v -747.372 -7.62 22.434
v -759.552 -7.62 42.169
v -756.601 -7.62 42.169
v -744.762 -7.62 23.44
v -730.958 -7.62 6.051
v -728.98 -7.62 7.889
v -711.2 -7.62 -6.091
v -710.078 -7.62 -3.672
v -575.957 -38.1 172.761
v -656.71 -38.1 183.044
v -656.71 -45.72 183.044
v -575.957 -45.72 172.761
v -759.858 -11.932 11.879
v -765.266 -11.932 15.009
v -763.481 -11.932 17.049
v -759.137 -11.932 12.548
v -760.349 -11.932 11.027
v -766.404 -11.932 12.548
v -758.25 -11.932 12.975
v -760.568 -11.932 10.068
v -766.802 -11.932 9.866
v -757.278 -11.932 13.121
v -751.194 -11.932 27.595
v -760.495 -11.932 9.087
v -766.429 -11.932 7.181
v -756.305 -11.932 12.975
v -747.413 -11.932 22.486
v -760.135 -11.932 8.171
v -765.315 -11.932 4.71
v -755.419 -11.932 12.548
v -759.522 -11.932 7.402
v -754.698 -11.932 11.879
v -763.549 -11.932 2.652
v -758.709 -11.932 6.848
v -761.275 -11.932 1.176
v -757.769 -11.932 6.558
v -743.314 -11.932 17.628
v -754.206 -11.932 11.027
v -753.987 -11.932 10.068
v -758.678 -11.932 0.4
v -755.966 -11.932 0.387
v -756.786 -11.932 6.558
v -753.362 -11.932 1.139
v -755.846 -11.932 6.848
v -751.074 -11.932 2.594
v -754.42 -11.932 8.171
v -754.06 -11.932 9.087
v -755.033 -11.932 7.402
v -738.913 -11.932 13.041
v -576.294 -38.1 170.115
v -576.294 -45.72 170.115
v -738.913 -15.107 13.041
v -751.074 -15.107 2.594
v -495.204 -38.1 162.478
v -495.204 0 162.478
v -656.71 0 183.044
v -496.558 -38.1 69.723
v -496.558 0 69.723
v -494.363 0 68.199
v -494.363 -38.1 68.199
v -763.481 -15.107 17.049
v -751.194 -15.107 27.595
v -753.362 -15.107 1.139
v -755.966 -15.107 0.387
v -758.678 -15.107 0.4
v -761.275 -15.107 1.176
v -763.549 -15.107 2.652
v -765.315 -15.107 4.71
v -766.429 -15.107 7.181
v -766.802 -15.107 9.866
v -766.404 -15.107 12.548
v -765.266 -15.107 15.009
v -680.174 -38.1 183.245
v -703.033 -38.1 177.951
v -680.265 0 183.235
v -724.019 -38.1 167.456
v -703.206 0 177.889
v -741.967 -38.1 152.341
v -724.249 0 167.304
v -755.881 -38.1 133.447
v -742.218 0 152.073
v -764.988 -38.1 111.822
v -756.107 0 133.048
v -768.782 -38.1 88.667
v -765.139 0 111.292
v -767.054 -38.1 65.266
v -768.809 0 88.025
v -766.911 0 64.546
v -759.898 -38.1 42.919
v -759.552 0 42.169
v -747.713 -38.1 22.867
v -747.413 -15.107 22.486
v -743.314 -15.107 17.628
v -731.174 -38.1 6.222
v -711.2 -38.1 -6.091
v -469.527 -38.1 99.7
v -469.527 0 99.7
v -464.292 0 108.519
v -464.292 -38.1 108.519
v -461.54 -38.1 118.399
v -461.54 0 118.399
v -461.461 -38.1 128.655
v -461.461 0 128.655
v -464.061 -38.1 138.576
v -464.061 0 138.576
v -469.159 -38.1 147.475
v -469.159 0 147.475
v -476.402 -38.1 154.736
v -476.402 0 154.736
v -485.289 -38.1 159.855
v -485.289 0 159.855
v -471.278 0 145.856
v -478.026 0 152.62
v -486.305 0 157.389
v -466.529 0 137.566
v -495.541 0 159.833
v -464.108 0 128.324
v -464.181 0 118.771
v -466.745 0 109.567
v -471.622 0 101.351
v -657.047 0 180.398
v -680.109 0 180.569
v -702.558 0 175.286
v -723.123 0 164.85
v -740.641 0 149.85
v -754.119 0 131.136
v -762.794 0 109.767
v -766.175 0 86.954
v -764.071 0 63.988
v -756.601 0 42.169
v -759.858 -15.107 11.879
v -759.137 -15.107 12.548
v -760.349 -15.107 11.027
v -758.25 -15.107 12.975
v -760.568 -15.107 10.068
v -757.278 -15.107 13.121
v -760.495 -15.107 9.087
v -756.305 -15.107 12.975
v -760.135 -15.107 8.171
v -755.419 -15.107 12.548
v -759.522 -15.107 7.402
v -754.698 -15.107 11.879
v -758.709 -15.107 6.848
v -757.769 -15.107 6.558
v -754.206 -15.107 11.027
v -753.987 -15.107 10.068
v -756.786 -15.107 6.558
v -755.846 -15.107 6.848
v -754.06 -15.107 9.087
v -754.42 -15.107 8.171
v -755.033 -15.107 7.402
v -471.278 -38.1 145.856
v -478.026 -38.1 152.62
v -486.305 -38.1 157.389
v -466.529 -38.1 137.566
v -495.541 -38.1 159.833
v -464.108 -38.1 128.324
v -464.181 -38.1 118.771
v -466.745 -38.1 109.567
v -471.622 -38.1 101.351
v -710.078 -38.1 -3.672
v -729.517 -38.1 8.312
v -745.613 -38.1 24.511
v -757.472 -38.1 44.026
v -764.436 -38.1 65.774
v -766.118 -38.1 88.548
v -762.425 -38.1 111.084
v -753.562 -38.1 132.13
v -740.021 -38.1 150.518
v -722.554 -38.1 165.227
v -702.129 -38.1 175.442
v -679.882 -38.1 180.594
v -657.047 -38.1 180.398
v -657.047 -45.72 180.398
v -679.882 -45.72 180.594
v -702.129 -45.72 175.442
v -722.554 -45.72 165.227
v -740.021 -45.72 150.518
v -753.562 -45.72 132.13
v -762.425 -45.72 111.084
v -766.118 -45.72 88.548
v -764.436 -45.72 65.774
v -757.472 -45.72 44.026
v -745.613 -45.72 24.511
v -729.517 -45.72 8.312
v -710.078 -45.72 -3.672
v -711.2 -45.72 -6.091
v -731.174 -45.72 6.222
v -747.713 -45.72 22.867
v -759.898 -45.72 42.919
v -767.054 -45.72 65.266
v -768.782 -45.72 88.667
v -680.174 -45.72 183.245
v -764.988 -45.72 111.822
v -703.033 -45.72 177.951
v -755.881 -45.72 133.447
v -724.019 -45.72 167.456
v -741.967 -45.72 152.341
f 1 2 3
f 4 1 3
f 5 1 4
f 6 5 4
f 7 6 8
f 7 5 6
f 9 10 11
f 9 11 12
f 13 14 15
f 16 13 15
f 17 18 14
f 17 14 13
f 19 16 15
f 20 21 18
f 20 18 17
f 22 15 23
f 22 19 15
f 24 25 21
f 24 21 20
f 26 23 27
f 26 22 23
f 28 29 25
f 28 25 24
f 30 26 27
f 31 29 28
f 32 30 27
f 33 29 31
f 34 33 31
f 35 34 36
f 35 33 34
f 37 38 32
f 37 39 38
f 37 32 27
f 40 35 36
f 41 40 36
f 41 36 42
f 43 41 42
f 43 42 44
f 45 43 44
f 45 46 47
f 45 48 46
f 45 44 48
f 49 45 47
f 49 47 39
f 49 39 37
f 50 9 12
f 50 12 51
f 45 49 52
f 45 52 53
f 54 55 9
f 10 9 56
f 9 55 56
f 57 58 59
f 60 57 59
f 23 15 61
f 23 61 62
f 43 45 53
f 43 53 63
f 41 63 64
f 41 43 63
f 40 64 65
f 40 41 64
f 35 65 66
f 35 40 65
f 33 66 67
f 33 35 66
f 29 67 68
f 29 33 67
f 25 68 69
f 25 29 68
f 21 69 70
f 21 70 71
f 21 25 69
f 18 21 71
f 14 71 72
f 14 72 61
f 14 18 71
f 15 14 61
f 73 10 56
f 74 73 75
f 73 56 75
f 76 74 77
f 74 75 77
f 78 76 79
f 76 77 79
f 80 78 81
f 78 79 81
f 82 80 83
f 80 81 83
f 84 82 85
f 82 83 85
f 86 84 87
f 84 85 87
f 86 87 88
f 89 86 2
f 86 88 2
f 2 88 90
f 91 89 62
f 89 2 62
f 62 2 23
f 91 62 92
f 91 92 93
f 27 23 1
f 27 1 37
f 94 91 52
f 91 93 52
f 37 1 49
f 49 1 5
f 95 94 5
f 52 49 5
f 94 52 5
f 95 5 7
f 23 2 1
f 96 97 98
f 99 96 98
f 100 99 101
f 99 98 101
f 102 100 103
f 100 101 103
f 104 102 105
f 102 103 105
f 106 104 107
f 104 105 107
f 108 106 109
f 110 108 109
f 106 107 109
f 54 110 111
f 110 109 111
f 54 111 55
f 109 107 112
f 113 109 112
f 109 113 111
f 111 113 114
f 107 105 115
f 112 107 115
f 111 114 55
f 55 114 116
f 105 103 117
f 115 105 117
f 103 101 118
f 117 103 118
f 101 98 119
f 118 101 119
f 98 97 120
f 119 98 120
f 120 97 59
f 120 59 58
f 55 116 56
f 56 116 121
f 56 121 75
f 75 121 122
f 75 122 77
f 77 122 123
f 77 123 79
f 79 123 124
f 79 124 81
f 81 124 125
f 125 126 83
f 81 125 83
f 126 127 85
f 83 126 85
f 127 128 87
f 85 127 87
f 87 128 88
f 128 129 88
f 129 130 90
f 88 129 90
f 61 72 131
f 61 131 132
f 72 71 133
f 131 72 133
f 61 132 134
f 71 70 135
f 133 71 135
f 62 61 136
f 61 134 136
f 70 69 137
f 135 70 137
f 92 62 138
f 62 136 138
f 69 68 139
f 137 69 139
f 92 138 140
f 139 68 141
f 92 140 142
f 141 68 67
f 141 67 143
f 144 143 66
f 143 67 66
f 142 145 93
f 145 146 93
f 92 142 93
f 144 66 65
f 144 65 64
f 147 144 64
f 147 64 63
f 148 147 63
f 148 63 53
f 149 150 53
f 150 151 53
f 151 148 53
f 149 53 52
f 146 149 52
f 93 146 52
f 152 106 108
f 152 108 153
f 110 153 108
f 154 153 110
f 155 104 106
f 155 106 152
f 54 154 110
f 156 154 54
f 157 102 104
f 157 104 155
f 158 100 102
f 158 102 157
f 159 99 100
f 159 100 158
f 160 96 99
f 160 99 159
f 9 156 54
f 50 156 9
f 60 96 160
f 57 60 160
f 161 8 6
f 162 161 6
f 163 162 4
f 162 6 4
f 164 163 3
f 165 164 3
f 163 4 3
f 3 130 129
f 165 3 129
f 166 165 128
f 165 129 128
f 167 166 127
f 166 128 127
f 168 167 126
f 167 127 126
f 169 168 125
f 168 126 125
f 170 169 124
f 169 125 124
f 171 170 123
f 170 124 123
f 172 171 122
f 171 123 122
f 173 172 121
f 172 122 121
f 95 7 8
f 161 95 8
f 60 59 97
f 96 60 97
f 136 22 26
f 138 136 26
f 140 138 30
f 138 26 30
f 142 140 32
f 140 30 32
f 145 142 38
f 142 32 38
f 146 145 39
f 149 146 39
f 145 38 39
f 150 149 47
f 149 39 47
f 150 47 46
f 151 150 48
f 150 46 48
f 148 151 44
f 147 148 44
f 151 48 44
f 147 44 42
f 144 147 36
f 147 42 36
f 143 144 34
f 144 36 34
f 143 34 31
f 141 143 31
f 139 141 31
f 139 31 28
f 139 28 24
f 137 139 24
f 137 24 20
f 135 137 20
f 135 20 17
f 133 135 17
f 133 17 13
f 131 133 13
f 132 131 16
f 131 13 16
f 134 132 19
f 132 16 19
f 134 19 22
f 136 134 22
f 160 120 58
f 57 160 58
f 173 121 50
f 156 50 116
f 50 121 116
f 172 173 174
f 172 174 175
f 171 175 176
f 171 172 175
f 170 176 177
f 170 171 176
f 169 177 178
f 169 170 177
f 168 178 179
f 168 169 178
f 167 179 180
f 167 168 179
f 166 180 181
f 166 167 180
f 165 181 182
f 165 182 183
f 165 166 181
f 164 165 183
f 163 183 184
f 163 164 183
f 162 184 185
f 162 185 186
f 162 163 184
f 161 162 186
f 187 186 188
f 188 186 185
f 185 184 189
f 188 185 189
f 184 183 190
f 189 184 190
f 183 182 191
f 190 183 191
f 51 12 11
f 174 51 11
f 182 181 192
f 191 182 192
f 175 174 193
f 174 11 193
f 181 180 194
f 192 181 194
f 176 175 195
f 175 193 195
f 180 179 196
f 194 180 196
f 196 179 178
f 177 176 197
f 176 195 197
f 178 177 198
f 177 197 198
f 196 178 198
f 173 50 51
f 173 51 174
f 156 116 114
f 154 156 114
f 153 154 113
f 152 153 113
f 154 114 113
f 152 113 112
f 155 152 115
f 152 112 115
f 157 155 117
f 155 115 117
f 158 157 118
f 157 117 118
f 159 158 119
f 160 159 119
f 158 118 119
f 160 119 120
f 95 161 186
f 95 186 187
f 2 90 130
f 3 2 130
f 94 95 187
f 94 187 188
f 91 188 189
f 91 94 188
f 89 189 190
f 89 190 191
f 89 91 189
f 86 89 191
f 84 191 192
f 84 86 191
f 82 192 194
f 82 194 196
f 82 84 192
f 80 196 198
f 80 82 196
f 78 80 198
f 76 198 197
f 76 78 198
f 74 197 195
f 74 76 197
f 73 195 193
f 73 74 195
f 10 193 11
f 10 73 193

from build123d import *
from build123d.topology import SkipClean

# Parameters (mm, degrees)
BASE_FLANGE1_DEPTH  = 38.1
CUT_EXTRUDE1_DEPTH  = 7.62
SKETCH9_R           = 3.3
BOSS_EXTRUDE1_DEPTH = 3.175
BOSS_EXTRUDE2_DEPTH = 7.62


# Sheet-metal steps are written as plain solids
with BuildPart() as part:
    # Sketch1 → Base-Flange1 (new body)
    with BuildSketch(Plane(origin=(0, 0, 0), x_dir=(1, 0, 0), z_dir=(0, 1, 0))):
        with BuildLine():
            Line((-657.047015903, -180.398251424), (-495.540915967, -159.83264605))
            ThreePointArc((-495.540915967, -159.83264605), (-466.529161595, -137.56639807), (-471.621526187, -101.351269827))
            Line((-471.621526187, -101.351269827), (-496.558145126, -69.722999952))
            Line((-496.558145126, -69.722999952), (-494.363477067, -68.198999952))
            Line((-494.363477067, -68.198999952), (-469.527179345, -99.700027778))
            ThreePointArc((-469.527179345, -99.700027778), (-464.060656724, -138.576037958), (-495.204030033, -162.478283377))
            Line((-495.204030033, -162.478283377), (-656.710129969, -183.043888751))
            ThreePointArc((-656.710129969, -183.043888751), (-764.987734735, -111.822063922), (-711.2, 6.090902363))
            Line((-711.2, 6.090902363), (-710.077660148, 3.671554877))
            ThreePointArc((-710.077660148, 3.671554877), (-762.424972114, -111.083730158), (-657.047015903, -180.398251424))
        make_face()
    extrude(amount=-BASE_FLANGE1_DEPTH)

    # Sketch7 → Cut-Extrude1 (cut)
    with BuildSketch(Plane(origin=(-711.2, 0, -6.090902363), x_dir=(1, 0, 0), z_dir=(0, 1, 0))):
        with BuildLine():
            Line((1.122339852, -2.419347486), (0, 0))
            ThreePointArc((0, 0), (-28.443609249, -19.854342865), (-48.352212426, -48.26))
            Line((-48.352212426, -48.26), (-45.400744677, -48.26))
            ThreePointArc((-45.400744677, -48.26), (-26.116771828, -21.302890058), (1.122339852, -2.419347486))
        make_face()
    extrude(amount=-CUT_EXTRUDE1_DEPTH, mode=Mode.SUBTRACT)

    # Sketch9 → Boss-Extrude1 (add)
    with BuildSketch(Plane(origin=(0, -11.93175668, 0), x_dir=(1, 0, 0), z_dir=(0, 1, 0))):
        with BuildLine():
            ThreePointArc((-751.074016673, -2.593523568), (-764.50540437, -3.617766971), (-763.481160967, -17.049154667))
            Line((-763.481160967, -17.049154667), (-751.193944793, -27.595167013))
            ThreePointArc((-751.193944793, -27.595167013), (-745.401952839, -20.024035331), (-738.912633033, -13.041347154))
            Line((-738.912633033, -13.041347154), (-751.074016673, -2.593523568))
        make_face()
        with Locations(Location((-757.27758882, -9.821339117, 0), (0, 0, 270))):
            Circle(SKETCH9_R, mode=Mode.SUBTRACT)
    extrude(amount=-BOSS_EXTRUDE1_DEPTH)

    # Sketch10 → Boss-Extrude2 (add)
    with SkipClean():  # the faces are left unmerged after this step: merging them gives an invalid solid
        with BuildSketch(Plane.XZ.offset(38.1)):
            with BuildLine():
                Line((-710.077660148, -3.671554877), (-711.2, -6.090902363))
                ThreePointArc((-711.2, -6.090902363), (-764.987734735, 111.822063922), (-656.710129969, 183.043888751))
                Line((-656.710129969, 183.043888751), (-575.957080001, 172.761086064))
                Line((-575.957080001, 172.761086064), (-576.293965935, 170.115448737))
                Line((-576.293965935, 170.115448737), (-657.047015903, 180.398251424))
                ThreePointArc((-657.047015903, 180.398251424), (-762.424972114, 111.083730158), (-710.077660148, -3.671554877))
            make_face()
        extrude(amount=BOSS_EXTRUDE2_DEPTH)


solid = part.part
